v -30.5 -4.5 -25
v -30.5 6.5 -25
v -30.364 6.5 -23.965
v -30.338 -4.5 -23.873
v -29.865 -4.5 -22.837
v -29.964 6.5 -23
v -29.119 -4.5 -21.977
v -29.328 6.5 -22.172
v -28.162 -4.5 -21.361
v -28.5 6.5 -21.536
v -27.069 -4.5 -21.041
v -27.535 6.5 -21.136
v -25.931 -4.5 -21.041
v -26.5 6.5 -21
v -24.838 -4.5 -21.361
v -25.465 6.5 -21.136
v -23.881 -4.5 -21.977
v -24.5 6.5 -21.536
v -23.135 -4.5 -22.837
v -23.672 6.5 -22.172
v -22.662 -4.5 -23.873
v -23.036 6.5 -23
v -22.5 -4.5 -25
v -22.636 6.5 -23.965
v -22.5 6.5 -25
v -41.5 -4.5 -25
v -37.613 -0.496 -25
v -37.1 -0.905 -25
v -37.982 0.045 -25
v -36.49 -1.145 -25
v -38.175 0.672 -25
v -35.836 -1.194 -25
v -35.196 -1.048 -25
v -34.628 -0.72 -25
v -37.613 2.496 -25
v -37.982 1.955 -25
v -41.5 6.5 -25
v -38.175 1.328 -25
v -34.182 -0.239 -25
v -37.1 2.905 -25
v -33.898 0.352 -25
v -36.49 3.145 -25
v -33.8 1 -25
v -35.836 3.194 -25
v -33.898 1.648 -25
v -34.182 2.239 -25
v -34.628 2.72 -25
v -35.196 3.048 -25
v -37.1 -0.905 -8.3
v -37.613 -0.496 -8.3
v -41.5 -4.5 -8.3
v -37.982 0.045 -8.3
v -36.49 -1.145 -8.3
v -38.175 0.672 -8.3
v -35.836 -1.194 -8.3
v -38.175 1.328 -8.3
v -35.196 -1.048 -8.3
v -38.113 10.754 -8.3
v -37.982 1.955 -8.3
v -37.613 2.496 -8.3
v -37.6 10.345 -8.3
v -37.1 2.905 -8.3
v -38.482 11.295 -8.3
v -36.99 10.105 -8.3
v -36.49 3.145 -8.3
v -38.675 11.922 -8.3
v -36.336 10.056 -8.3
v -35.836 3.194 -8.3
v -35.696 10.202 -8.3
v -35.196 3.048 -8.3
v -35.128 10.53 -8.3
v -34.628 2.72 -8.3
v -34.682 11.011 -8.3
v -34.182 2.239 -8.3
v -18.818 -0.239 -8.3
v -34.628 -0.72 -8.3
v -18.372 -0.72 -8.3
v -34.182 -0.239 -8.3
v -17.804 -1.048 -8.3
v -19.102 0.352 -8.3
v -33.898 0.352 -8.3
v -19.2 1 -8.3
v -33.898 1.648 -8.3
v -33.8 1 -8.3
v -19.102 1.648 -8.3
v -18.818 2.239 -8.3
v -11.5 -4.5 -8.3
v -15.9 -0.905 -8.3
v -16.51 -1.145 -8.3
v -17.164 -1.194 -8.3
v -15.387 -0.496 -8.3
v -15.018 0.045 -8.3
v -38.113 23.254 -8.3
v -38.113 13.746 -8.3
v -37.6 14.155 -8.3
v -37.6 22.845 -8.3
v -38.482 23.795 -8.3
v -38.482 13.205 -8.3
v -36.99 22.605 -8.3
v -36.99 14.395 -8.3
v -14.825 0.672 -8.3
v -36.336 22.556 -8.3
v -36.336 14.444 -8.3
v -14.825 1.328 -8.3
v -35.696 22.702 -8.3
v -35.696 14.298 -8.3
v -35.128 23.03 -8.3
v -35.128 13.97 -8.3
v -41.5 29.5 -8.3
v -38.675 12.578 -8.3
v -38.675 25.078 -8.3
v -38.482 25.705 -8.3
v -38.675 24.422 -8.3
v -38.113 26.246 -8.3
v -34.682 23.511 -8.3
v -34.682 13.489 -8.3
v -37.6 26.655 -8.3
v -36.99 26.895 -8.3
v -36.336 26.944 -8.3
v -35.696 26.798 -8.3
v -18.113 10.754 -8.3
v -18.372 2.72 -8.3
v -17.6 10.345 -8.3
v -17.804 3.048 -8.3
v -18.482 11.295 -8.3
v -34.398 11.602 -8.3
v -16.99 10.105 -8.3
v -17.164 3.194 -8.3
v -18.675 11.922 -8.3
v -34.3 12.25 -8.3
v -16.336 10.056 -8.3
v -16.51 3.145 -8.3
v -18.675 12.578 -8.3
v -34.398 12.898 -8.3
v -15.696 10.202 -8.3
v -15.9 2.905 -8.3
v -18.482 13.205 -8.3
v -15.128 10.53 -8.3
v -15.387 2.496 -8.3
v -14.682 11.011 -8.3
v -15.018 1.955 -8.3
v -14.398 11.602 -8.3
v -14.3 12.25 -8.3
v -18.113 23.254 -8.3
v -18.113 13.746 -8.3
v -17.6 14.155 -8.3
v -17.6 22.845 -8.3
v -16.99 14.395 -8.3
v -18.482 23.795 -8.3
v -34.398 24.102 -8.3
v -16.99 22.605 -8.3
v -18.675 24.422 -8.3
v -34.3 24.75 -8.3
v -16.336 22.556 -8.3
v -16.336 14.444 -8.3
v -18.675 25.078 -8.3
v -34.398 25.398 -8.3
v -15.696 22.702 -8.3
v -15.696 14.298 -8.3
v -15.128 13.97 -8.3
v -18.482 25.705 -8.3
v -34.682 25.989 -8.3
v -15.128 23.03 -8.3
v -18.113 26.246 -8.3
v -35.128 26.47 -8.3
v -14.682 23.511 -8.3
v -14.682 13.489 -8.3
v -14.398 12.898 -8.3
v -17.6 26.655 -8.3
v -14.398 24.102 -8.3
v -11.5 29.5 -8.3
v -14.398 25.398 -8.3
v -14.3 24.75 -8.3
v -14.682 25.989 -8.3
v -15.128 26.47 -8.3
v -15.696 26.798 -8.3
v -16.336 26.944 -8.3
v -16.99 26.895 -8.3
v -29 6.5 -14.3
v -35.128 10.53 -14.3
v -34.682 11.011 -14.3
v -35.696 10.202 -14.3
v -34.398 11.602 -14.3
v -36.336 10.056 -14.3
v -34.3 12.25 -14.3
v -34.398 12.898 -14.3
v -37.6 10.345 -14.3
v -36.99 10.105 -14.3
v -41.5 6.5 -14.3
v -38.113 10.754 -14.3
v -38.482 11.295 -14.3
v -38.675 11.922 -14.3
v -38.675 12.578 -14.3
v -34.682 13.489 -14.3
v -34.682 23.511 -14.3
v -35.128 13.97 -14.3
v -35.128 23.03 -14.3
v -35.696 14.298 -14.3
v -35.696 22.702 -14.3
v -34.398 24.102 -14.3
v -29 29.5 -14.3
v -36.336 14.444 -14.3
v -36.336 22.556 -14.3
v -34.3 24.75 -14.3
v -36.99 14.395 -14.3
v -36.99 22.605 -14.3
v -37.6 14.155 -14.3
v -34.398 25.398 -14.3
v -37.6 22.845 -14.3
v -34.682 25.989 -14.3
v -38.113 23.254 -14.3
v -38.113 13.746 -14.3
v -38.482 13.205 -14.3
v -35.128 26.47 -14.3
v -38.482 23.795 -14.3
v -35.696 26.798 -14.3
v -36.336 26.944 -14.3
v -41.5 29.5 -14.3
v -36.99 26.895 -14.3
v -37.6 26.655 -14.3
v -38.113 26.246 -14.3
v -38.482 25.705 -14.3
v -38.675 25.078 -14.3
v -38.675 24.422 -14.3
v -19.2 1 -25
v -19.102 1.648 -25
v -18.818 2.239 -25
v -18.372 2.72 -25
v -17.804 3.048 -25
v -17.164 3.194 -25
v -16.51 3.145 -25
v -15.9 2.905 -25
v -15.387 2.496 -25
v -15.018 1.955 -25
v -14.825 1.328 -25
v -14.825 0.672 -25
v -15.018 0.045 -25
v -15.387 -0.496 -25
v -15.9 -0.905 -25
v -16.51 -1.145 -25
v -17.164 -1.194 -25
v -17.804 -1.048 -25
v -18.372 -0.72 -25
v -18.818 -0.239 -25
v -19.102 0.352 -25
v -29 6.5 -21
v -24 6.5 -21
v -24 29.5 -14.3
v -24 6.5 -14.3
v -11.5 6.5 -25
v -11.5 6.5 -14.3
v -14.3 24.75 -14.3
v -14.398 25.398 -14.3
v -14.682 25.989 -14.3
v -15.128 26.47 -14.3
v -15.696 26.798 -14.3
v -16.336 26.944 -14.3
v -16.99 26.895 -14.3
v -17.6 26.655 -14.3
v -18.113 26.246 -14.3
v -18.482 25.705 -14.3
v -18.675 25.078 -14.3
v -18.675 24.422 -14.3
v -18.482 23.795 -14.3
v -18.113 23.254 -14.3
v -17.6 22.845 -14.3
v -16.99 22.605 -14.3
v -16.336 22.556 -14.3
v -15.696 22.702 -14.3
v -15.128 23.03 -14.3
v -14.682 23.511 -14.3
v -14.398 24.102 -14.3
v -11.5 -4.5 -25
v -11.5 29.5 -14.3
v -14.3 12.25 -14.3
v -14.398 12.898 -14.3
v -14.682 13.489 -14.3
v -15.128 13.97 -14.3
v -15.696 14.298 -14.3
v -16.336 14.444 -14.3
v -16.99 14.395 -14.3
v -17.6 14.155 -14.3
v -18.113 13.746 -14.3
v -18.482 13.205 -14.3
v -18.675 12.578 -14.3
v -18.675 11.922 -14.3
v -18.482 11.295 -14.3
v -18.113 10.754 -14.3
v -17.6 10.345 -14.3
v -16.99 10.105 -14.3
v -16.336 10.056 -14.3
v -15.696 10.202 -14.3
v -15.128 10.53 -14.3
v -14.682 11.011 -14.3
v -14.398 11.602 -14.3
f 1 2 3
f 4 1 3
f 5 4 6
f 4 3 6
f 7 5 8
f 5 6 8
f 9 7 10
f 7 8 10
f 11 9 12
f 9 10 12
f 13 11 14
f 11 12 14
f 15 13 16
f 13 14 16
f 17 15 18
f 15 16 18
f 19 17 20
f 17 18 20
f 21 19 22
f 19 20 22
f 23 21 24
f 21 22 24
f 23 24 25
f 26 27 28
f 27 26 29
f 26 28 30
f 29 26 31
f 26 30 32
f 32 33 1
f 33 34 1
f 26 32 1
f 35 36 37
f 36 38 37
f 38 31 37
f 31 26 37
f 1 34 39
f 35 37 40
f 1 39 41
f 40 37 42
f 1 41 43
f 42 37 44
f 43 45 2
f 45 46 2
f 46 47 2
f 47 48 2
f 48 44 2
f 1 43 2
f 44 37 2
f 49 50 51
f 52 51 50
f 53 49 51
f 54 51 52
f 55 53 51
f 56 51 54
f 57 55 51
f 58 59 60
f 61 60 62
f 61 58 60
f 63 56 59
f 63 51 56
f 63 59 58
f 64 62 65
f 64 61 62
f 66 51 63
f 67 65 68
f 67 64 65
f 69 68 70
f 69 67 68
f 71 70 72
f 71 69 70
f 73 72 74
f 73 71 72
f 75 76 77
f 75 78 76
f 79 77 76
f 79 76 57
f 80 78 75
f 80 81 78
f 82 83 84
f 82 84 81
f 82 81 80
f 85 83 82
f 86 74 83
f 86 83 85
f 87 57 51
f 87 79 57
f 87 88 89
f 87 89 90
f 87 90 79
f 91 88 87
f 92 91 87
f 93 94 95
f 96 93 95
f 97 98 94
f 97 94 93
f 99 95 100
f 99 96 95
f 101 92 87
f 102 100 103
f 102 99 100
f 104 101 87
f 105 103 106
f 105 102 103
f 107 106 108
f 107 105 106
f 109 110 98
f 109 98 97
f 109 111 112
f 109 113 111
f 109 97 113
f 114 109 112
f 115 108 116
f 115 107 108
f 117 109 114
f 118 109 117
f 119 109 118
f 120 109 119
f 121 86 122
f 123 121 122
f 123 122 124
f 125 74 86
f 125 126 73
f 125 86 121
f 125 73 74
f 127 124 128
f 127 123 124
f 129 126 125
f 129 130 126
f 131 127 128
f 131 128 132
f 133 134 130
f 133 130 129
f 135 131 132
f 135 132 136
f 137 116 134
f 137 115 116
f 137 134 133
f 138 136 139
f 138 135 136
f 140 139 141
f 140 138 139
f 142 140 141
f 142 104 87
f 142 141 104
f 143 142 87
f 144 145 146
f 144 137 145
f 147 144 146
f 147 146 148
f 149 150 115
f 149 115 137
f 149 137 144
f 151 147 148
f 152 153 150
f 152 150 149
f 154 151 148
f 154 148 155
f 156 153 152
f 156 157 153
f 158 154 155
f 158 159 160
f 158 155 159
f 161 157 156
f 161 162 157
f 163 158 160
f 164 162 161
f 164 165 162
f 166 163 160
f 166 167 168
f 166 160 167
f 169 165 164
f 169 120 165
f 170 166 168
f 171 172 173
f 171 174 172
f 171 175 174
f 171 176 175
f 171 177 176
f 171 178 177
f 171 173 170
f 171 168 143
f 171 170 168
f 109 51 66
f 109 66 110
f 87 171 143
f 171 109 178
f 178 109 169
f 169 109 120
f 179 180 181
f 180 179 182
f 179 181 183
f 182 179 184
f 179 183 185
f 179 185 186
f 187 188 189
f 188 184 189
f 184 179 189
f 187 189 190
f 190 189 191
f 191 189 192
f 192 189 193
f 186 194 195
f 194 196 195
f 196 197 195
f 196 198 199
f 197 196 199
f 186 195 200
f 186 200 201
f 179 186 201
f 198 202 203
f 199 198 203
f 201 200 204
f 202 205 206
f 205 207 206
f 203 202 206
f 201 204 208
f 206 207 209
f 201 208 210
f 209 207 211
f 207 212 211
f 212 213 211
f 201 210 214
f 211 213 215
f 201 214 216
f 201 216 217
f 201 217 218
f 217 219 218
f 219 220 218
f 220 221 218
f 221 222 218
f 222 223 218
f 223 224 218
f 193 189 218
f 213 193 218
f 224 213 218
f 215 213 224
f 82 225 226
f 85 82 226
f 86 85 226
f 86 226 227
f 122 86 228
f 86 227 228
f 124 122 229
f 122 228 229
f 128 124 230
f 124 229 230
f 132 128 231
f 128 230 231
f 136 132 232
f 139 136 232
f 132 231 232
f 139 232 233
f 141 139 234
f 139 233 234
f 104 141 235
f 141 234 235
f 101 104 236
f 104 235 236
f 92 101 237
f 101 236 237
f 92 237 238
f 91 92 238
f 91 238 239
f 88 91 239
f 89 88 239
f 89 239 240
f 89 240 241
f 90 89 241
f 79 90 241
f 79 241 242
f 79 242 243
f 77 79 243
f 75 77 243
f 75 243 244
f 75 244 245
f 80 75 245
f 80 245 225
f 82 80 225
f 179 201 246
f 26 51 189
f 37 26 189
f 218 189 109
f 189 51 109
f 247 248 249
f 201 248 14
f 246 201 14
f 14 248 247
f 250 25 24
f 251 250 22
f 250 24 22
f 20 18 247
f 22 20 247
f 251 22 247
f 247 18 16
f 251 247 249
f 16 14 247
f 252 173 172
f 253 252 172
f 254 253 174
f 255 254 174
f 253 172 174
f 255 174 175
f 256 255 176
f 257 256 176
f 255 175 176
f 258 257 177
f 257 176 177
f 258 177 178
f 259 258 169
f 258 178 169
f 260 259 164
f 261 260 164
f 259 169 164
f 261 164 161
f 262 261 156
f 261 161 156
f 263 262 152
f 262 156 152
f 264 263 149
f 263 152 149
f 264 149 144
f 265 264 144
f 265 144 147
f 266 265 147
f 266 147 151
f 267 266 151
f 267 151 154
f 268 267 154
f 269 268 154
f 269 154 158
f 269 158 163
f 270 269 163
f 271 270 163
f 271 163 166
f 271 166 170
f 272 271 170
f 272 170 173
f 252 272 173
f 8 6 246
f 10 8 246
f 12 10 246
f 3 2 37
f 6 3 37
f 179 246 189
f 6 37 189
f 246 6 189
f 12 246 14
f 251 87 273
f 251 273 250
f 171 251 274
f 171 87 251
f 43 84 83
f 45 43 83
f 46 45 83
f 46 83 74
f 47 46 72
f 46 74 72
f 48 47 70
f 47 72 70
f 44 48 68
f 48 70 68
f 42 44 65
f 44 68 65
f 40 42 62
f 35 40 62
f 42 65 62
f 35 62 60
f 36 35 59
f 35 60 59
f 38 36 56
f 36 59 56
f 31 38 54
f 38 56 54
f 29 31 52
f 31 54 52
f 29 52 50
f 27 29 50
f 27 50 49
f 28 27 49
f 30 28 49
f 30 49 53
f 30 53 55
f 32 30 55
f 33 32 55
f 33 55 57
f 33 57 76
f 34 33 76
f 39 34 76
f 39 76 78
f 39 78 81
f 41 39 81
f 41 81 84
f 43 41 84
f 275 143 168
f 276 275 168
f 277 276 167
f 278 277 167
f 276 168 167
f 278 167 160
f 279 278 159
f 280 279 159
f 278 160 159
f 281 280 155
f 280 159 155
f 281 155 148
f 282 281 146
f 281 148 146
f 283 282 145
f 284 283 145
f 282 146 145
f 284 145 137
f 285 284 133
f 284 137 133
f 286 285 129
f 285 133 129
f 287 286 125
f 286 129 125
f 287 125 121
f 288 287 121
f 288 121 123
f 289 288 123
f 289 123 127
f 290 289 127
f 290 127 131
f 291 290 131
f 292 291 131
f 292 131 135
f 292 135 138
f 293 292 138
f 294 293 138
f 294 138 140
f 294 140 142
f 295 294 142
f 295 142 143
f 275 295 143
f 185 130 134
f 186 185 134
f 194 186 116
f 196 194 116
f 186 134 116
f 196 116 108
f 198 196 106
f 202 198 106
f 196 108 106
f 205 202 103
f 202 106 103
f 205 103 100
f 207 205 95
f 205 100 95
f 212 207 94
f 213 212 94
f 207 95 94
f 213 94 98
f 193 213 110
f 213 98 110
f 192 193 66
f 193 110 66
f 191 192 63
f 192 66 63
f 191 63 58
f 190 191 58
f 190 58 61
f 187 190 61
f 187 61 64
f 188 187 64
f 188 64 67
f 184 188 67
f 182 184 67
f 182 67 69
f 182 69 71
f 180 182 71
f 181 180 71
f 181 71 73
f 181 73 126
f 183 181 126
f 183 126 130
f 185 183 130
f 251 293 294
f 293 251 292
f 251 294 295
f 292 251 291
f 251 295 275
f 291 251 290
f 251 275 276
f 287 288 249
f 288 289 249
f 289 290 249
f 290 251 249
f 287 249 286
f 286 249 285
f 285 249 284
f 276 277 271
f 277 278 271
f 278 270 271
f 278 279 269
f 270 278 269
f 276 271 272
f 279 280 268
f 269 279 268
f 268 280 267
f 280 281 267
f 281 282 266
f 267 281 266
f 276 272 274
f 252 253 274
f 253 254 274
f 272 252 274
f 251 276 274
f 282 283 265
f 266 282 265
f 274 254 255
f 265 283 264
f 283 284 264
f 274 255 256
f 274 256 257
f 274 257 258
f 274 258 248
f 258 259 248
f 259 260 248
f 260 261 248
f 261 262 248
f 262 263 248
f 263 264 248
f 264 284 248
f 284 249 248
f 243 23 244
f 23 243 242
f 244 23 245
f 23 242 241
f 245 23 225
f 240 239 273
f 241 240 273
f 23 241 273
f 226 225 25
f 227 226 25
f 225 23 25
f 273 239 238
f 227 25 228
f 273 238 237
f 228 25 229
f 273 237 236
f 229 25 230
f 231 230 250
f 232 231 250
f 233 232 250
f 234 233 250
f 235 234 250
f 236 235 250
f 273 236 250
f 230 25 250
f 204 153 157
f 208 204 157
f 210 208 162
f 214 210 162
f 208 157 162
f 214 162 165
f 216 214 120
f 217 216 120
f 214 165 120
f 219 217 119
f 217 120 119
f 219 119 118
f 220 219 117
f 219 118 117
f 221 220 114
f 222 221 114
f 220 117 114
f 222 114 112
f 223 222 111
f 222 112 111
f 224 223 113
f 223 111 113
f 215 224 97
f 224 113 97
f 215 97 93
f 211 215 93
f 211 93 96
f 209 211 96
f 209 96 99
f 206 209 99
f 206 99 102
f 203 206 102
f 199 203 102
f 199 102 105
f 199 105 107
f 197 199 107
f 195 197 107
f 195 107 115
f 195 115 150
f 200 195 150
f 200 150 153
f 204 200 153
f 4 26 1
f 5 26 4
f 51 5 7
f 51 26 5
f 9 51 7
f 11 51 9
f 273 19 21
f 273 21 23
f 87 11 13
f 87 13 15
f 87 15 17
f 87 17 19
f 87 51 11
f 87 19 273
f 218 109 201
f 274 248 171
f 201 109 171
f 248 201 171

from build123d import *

# Parameters (mm, degrees)
SKETCH1_W           = 30
SKETCH1_H           = 34
BOSS_EXTRUDE1_DEPTH = 16.7
SKETCH2_W           = 10.7
SKETCH2_H           = 23
CUT_EXTRUDE1_DEPTH  = 49.94129136
HOLE1_D             = 4.4
HOLE2_D             = 4.4
HOLE3_D             = 4.4
HOLE4_D             = 4.4
HOLE5_D             = 4.4
HOLE6_D             = 4.4
HOLE7_D             = 8
HOLE7_DEPTH         = 34
RIB1_REACH          = 43.476
SKETCH17_WALL_W     = 108.907794566
SKETCH17_WALL_H     = 5


with BuildPart() as part:
    # Sketch1 → Boss-Extrude1 (new body)
    with BuildSketch(Plane.XY.offset(-8.3)):
        with Locations((-26.5, 12.5)):
            Rectangle(SKETCH1_W, SKETCH1_H)
    extrude(amount=-BOSS_EXTRUDE1_DEPTH)

    # Sketch2 → Cut-Extrude1 (cut, through all)
    with BuildSketch(Plane.ZY.offset(41.5)):
        with Locations((-19.65, 18)):
            Rectangle(SKETCH2_W, SKETCH2_H)
    extrude(amount=-CUT_EXTRUDE1_DEPTH, mode=Mode.SUBTRACT)

    # Hole1 (through all)
    with Locations(Plane(origin=(0, 0, -14.3), x_dir=(-1, 0, 0), z_dir=(0, 0, -1))):
        with Locations((16.5, 12.25)):
            Hole(HOLE1_D / 2)

    # Hole2 (through all)
    with Locations(Plane(origin=(0, 0, -14.3), x_dir=(-1, 0, 0), z_dir=(0, 0, -1))):
        with Locations((36.5, 12.25)):
            Hole(HOLE2_D / 2)

    # Hole3 (through all)
    with Locations(Plane(origin=(0, 0, -14.3), x_dir=(-1, 0, 0), z_dir=(0, 0, -1))):
        with Locations((36.5, 24.75)):
            Hole(HOLE3_D / 2)

    # Hole4 (through all)
    with Locations(Plane(origin=(0, 0, -14.3), x_dir=(-1, 0, 0), z_dir=(0, 0, -1))):
        with Locations((16.5, 24.75)):
            Hole(HOLE4_D / 2)

    # Hole5 (through all)
    with Locations(Plane(origin=(0, 0, -25), x_dir=(-1, 0, 0), z_dir=(0, 0, -1))):
        with Locations((36, 1)):
            Hole(HOLE5_D / 2)

    # Hole6 (through all)
    with Locations(Plane.XY.offset(-8.3)):
        with Locations((-17, 1)):
            Hole(HOLE6_D / 2)

    # Hole7
    with Locations(Plane.XZ.offset(4.5)):
        with Locations((-26.5, -25)):
            Hole(HOLE7_D / 2, depth=HOLE7_DEPTH)

    # Sketch17 wall → Rib1 (add, up to next)
    with BuildSketch(Plane(origin=(-26.5, 18, -17.65), x_dir=(0, -0.960093451224, -0.279679396661), z_dir=(0, -0.279679396661, 0.960093451224)), mode=Mode.PRIVATE) as rib1_sk1:
        Rectangle(SKETCH17_WALL_W, SKETCH17_WALL_H)
    rib1_tool1 = extrude(rib1_sk1.sketch, amount=RIB1_REACH, mode=Mode.PRIVATE) - part.part
    add(rib1_tool1.solids().sort_by_distance((-26.5, 18, -17.65))[0])


solid = part.part
